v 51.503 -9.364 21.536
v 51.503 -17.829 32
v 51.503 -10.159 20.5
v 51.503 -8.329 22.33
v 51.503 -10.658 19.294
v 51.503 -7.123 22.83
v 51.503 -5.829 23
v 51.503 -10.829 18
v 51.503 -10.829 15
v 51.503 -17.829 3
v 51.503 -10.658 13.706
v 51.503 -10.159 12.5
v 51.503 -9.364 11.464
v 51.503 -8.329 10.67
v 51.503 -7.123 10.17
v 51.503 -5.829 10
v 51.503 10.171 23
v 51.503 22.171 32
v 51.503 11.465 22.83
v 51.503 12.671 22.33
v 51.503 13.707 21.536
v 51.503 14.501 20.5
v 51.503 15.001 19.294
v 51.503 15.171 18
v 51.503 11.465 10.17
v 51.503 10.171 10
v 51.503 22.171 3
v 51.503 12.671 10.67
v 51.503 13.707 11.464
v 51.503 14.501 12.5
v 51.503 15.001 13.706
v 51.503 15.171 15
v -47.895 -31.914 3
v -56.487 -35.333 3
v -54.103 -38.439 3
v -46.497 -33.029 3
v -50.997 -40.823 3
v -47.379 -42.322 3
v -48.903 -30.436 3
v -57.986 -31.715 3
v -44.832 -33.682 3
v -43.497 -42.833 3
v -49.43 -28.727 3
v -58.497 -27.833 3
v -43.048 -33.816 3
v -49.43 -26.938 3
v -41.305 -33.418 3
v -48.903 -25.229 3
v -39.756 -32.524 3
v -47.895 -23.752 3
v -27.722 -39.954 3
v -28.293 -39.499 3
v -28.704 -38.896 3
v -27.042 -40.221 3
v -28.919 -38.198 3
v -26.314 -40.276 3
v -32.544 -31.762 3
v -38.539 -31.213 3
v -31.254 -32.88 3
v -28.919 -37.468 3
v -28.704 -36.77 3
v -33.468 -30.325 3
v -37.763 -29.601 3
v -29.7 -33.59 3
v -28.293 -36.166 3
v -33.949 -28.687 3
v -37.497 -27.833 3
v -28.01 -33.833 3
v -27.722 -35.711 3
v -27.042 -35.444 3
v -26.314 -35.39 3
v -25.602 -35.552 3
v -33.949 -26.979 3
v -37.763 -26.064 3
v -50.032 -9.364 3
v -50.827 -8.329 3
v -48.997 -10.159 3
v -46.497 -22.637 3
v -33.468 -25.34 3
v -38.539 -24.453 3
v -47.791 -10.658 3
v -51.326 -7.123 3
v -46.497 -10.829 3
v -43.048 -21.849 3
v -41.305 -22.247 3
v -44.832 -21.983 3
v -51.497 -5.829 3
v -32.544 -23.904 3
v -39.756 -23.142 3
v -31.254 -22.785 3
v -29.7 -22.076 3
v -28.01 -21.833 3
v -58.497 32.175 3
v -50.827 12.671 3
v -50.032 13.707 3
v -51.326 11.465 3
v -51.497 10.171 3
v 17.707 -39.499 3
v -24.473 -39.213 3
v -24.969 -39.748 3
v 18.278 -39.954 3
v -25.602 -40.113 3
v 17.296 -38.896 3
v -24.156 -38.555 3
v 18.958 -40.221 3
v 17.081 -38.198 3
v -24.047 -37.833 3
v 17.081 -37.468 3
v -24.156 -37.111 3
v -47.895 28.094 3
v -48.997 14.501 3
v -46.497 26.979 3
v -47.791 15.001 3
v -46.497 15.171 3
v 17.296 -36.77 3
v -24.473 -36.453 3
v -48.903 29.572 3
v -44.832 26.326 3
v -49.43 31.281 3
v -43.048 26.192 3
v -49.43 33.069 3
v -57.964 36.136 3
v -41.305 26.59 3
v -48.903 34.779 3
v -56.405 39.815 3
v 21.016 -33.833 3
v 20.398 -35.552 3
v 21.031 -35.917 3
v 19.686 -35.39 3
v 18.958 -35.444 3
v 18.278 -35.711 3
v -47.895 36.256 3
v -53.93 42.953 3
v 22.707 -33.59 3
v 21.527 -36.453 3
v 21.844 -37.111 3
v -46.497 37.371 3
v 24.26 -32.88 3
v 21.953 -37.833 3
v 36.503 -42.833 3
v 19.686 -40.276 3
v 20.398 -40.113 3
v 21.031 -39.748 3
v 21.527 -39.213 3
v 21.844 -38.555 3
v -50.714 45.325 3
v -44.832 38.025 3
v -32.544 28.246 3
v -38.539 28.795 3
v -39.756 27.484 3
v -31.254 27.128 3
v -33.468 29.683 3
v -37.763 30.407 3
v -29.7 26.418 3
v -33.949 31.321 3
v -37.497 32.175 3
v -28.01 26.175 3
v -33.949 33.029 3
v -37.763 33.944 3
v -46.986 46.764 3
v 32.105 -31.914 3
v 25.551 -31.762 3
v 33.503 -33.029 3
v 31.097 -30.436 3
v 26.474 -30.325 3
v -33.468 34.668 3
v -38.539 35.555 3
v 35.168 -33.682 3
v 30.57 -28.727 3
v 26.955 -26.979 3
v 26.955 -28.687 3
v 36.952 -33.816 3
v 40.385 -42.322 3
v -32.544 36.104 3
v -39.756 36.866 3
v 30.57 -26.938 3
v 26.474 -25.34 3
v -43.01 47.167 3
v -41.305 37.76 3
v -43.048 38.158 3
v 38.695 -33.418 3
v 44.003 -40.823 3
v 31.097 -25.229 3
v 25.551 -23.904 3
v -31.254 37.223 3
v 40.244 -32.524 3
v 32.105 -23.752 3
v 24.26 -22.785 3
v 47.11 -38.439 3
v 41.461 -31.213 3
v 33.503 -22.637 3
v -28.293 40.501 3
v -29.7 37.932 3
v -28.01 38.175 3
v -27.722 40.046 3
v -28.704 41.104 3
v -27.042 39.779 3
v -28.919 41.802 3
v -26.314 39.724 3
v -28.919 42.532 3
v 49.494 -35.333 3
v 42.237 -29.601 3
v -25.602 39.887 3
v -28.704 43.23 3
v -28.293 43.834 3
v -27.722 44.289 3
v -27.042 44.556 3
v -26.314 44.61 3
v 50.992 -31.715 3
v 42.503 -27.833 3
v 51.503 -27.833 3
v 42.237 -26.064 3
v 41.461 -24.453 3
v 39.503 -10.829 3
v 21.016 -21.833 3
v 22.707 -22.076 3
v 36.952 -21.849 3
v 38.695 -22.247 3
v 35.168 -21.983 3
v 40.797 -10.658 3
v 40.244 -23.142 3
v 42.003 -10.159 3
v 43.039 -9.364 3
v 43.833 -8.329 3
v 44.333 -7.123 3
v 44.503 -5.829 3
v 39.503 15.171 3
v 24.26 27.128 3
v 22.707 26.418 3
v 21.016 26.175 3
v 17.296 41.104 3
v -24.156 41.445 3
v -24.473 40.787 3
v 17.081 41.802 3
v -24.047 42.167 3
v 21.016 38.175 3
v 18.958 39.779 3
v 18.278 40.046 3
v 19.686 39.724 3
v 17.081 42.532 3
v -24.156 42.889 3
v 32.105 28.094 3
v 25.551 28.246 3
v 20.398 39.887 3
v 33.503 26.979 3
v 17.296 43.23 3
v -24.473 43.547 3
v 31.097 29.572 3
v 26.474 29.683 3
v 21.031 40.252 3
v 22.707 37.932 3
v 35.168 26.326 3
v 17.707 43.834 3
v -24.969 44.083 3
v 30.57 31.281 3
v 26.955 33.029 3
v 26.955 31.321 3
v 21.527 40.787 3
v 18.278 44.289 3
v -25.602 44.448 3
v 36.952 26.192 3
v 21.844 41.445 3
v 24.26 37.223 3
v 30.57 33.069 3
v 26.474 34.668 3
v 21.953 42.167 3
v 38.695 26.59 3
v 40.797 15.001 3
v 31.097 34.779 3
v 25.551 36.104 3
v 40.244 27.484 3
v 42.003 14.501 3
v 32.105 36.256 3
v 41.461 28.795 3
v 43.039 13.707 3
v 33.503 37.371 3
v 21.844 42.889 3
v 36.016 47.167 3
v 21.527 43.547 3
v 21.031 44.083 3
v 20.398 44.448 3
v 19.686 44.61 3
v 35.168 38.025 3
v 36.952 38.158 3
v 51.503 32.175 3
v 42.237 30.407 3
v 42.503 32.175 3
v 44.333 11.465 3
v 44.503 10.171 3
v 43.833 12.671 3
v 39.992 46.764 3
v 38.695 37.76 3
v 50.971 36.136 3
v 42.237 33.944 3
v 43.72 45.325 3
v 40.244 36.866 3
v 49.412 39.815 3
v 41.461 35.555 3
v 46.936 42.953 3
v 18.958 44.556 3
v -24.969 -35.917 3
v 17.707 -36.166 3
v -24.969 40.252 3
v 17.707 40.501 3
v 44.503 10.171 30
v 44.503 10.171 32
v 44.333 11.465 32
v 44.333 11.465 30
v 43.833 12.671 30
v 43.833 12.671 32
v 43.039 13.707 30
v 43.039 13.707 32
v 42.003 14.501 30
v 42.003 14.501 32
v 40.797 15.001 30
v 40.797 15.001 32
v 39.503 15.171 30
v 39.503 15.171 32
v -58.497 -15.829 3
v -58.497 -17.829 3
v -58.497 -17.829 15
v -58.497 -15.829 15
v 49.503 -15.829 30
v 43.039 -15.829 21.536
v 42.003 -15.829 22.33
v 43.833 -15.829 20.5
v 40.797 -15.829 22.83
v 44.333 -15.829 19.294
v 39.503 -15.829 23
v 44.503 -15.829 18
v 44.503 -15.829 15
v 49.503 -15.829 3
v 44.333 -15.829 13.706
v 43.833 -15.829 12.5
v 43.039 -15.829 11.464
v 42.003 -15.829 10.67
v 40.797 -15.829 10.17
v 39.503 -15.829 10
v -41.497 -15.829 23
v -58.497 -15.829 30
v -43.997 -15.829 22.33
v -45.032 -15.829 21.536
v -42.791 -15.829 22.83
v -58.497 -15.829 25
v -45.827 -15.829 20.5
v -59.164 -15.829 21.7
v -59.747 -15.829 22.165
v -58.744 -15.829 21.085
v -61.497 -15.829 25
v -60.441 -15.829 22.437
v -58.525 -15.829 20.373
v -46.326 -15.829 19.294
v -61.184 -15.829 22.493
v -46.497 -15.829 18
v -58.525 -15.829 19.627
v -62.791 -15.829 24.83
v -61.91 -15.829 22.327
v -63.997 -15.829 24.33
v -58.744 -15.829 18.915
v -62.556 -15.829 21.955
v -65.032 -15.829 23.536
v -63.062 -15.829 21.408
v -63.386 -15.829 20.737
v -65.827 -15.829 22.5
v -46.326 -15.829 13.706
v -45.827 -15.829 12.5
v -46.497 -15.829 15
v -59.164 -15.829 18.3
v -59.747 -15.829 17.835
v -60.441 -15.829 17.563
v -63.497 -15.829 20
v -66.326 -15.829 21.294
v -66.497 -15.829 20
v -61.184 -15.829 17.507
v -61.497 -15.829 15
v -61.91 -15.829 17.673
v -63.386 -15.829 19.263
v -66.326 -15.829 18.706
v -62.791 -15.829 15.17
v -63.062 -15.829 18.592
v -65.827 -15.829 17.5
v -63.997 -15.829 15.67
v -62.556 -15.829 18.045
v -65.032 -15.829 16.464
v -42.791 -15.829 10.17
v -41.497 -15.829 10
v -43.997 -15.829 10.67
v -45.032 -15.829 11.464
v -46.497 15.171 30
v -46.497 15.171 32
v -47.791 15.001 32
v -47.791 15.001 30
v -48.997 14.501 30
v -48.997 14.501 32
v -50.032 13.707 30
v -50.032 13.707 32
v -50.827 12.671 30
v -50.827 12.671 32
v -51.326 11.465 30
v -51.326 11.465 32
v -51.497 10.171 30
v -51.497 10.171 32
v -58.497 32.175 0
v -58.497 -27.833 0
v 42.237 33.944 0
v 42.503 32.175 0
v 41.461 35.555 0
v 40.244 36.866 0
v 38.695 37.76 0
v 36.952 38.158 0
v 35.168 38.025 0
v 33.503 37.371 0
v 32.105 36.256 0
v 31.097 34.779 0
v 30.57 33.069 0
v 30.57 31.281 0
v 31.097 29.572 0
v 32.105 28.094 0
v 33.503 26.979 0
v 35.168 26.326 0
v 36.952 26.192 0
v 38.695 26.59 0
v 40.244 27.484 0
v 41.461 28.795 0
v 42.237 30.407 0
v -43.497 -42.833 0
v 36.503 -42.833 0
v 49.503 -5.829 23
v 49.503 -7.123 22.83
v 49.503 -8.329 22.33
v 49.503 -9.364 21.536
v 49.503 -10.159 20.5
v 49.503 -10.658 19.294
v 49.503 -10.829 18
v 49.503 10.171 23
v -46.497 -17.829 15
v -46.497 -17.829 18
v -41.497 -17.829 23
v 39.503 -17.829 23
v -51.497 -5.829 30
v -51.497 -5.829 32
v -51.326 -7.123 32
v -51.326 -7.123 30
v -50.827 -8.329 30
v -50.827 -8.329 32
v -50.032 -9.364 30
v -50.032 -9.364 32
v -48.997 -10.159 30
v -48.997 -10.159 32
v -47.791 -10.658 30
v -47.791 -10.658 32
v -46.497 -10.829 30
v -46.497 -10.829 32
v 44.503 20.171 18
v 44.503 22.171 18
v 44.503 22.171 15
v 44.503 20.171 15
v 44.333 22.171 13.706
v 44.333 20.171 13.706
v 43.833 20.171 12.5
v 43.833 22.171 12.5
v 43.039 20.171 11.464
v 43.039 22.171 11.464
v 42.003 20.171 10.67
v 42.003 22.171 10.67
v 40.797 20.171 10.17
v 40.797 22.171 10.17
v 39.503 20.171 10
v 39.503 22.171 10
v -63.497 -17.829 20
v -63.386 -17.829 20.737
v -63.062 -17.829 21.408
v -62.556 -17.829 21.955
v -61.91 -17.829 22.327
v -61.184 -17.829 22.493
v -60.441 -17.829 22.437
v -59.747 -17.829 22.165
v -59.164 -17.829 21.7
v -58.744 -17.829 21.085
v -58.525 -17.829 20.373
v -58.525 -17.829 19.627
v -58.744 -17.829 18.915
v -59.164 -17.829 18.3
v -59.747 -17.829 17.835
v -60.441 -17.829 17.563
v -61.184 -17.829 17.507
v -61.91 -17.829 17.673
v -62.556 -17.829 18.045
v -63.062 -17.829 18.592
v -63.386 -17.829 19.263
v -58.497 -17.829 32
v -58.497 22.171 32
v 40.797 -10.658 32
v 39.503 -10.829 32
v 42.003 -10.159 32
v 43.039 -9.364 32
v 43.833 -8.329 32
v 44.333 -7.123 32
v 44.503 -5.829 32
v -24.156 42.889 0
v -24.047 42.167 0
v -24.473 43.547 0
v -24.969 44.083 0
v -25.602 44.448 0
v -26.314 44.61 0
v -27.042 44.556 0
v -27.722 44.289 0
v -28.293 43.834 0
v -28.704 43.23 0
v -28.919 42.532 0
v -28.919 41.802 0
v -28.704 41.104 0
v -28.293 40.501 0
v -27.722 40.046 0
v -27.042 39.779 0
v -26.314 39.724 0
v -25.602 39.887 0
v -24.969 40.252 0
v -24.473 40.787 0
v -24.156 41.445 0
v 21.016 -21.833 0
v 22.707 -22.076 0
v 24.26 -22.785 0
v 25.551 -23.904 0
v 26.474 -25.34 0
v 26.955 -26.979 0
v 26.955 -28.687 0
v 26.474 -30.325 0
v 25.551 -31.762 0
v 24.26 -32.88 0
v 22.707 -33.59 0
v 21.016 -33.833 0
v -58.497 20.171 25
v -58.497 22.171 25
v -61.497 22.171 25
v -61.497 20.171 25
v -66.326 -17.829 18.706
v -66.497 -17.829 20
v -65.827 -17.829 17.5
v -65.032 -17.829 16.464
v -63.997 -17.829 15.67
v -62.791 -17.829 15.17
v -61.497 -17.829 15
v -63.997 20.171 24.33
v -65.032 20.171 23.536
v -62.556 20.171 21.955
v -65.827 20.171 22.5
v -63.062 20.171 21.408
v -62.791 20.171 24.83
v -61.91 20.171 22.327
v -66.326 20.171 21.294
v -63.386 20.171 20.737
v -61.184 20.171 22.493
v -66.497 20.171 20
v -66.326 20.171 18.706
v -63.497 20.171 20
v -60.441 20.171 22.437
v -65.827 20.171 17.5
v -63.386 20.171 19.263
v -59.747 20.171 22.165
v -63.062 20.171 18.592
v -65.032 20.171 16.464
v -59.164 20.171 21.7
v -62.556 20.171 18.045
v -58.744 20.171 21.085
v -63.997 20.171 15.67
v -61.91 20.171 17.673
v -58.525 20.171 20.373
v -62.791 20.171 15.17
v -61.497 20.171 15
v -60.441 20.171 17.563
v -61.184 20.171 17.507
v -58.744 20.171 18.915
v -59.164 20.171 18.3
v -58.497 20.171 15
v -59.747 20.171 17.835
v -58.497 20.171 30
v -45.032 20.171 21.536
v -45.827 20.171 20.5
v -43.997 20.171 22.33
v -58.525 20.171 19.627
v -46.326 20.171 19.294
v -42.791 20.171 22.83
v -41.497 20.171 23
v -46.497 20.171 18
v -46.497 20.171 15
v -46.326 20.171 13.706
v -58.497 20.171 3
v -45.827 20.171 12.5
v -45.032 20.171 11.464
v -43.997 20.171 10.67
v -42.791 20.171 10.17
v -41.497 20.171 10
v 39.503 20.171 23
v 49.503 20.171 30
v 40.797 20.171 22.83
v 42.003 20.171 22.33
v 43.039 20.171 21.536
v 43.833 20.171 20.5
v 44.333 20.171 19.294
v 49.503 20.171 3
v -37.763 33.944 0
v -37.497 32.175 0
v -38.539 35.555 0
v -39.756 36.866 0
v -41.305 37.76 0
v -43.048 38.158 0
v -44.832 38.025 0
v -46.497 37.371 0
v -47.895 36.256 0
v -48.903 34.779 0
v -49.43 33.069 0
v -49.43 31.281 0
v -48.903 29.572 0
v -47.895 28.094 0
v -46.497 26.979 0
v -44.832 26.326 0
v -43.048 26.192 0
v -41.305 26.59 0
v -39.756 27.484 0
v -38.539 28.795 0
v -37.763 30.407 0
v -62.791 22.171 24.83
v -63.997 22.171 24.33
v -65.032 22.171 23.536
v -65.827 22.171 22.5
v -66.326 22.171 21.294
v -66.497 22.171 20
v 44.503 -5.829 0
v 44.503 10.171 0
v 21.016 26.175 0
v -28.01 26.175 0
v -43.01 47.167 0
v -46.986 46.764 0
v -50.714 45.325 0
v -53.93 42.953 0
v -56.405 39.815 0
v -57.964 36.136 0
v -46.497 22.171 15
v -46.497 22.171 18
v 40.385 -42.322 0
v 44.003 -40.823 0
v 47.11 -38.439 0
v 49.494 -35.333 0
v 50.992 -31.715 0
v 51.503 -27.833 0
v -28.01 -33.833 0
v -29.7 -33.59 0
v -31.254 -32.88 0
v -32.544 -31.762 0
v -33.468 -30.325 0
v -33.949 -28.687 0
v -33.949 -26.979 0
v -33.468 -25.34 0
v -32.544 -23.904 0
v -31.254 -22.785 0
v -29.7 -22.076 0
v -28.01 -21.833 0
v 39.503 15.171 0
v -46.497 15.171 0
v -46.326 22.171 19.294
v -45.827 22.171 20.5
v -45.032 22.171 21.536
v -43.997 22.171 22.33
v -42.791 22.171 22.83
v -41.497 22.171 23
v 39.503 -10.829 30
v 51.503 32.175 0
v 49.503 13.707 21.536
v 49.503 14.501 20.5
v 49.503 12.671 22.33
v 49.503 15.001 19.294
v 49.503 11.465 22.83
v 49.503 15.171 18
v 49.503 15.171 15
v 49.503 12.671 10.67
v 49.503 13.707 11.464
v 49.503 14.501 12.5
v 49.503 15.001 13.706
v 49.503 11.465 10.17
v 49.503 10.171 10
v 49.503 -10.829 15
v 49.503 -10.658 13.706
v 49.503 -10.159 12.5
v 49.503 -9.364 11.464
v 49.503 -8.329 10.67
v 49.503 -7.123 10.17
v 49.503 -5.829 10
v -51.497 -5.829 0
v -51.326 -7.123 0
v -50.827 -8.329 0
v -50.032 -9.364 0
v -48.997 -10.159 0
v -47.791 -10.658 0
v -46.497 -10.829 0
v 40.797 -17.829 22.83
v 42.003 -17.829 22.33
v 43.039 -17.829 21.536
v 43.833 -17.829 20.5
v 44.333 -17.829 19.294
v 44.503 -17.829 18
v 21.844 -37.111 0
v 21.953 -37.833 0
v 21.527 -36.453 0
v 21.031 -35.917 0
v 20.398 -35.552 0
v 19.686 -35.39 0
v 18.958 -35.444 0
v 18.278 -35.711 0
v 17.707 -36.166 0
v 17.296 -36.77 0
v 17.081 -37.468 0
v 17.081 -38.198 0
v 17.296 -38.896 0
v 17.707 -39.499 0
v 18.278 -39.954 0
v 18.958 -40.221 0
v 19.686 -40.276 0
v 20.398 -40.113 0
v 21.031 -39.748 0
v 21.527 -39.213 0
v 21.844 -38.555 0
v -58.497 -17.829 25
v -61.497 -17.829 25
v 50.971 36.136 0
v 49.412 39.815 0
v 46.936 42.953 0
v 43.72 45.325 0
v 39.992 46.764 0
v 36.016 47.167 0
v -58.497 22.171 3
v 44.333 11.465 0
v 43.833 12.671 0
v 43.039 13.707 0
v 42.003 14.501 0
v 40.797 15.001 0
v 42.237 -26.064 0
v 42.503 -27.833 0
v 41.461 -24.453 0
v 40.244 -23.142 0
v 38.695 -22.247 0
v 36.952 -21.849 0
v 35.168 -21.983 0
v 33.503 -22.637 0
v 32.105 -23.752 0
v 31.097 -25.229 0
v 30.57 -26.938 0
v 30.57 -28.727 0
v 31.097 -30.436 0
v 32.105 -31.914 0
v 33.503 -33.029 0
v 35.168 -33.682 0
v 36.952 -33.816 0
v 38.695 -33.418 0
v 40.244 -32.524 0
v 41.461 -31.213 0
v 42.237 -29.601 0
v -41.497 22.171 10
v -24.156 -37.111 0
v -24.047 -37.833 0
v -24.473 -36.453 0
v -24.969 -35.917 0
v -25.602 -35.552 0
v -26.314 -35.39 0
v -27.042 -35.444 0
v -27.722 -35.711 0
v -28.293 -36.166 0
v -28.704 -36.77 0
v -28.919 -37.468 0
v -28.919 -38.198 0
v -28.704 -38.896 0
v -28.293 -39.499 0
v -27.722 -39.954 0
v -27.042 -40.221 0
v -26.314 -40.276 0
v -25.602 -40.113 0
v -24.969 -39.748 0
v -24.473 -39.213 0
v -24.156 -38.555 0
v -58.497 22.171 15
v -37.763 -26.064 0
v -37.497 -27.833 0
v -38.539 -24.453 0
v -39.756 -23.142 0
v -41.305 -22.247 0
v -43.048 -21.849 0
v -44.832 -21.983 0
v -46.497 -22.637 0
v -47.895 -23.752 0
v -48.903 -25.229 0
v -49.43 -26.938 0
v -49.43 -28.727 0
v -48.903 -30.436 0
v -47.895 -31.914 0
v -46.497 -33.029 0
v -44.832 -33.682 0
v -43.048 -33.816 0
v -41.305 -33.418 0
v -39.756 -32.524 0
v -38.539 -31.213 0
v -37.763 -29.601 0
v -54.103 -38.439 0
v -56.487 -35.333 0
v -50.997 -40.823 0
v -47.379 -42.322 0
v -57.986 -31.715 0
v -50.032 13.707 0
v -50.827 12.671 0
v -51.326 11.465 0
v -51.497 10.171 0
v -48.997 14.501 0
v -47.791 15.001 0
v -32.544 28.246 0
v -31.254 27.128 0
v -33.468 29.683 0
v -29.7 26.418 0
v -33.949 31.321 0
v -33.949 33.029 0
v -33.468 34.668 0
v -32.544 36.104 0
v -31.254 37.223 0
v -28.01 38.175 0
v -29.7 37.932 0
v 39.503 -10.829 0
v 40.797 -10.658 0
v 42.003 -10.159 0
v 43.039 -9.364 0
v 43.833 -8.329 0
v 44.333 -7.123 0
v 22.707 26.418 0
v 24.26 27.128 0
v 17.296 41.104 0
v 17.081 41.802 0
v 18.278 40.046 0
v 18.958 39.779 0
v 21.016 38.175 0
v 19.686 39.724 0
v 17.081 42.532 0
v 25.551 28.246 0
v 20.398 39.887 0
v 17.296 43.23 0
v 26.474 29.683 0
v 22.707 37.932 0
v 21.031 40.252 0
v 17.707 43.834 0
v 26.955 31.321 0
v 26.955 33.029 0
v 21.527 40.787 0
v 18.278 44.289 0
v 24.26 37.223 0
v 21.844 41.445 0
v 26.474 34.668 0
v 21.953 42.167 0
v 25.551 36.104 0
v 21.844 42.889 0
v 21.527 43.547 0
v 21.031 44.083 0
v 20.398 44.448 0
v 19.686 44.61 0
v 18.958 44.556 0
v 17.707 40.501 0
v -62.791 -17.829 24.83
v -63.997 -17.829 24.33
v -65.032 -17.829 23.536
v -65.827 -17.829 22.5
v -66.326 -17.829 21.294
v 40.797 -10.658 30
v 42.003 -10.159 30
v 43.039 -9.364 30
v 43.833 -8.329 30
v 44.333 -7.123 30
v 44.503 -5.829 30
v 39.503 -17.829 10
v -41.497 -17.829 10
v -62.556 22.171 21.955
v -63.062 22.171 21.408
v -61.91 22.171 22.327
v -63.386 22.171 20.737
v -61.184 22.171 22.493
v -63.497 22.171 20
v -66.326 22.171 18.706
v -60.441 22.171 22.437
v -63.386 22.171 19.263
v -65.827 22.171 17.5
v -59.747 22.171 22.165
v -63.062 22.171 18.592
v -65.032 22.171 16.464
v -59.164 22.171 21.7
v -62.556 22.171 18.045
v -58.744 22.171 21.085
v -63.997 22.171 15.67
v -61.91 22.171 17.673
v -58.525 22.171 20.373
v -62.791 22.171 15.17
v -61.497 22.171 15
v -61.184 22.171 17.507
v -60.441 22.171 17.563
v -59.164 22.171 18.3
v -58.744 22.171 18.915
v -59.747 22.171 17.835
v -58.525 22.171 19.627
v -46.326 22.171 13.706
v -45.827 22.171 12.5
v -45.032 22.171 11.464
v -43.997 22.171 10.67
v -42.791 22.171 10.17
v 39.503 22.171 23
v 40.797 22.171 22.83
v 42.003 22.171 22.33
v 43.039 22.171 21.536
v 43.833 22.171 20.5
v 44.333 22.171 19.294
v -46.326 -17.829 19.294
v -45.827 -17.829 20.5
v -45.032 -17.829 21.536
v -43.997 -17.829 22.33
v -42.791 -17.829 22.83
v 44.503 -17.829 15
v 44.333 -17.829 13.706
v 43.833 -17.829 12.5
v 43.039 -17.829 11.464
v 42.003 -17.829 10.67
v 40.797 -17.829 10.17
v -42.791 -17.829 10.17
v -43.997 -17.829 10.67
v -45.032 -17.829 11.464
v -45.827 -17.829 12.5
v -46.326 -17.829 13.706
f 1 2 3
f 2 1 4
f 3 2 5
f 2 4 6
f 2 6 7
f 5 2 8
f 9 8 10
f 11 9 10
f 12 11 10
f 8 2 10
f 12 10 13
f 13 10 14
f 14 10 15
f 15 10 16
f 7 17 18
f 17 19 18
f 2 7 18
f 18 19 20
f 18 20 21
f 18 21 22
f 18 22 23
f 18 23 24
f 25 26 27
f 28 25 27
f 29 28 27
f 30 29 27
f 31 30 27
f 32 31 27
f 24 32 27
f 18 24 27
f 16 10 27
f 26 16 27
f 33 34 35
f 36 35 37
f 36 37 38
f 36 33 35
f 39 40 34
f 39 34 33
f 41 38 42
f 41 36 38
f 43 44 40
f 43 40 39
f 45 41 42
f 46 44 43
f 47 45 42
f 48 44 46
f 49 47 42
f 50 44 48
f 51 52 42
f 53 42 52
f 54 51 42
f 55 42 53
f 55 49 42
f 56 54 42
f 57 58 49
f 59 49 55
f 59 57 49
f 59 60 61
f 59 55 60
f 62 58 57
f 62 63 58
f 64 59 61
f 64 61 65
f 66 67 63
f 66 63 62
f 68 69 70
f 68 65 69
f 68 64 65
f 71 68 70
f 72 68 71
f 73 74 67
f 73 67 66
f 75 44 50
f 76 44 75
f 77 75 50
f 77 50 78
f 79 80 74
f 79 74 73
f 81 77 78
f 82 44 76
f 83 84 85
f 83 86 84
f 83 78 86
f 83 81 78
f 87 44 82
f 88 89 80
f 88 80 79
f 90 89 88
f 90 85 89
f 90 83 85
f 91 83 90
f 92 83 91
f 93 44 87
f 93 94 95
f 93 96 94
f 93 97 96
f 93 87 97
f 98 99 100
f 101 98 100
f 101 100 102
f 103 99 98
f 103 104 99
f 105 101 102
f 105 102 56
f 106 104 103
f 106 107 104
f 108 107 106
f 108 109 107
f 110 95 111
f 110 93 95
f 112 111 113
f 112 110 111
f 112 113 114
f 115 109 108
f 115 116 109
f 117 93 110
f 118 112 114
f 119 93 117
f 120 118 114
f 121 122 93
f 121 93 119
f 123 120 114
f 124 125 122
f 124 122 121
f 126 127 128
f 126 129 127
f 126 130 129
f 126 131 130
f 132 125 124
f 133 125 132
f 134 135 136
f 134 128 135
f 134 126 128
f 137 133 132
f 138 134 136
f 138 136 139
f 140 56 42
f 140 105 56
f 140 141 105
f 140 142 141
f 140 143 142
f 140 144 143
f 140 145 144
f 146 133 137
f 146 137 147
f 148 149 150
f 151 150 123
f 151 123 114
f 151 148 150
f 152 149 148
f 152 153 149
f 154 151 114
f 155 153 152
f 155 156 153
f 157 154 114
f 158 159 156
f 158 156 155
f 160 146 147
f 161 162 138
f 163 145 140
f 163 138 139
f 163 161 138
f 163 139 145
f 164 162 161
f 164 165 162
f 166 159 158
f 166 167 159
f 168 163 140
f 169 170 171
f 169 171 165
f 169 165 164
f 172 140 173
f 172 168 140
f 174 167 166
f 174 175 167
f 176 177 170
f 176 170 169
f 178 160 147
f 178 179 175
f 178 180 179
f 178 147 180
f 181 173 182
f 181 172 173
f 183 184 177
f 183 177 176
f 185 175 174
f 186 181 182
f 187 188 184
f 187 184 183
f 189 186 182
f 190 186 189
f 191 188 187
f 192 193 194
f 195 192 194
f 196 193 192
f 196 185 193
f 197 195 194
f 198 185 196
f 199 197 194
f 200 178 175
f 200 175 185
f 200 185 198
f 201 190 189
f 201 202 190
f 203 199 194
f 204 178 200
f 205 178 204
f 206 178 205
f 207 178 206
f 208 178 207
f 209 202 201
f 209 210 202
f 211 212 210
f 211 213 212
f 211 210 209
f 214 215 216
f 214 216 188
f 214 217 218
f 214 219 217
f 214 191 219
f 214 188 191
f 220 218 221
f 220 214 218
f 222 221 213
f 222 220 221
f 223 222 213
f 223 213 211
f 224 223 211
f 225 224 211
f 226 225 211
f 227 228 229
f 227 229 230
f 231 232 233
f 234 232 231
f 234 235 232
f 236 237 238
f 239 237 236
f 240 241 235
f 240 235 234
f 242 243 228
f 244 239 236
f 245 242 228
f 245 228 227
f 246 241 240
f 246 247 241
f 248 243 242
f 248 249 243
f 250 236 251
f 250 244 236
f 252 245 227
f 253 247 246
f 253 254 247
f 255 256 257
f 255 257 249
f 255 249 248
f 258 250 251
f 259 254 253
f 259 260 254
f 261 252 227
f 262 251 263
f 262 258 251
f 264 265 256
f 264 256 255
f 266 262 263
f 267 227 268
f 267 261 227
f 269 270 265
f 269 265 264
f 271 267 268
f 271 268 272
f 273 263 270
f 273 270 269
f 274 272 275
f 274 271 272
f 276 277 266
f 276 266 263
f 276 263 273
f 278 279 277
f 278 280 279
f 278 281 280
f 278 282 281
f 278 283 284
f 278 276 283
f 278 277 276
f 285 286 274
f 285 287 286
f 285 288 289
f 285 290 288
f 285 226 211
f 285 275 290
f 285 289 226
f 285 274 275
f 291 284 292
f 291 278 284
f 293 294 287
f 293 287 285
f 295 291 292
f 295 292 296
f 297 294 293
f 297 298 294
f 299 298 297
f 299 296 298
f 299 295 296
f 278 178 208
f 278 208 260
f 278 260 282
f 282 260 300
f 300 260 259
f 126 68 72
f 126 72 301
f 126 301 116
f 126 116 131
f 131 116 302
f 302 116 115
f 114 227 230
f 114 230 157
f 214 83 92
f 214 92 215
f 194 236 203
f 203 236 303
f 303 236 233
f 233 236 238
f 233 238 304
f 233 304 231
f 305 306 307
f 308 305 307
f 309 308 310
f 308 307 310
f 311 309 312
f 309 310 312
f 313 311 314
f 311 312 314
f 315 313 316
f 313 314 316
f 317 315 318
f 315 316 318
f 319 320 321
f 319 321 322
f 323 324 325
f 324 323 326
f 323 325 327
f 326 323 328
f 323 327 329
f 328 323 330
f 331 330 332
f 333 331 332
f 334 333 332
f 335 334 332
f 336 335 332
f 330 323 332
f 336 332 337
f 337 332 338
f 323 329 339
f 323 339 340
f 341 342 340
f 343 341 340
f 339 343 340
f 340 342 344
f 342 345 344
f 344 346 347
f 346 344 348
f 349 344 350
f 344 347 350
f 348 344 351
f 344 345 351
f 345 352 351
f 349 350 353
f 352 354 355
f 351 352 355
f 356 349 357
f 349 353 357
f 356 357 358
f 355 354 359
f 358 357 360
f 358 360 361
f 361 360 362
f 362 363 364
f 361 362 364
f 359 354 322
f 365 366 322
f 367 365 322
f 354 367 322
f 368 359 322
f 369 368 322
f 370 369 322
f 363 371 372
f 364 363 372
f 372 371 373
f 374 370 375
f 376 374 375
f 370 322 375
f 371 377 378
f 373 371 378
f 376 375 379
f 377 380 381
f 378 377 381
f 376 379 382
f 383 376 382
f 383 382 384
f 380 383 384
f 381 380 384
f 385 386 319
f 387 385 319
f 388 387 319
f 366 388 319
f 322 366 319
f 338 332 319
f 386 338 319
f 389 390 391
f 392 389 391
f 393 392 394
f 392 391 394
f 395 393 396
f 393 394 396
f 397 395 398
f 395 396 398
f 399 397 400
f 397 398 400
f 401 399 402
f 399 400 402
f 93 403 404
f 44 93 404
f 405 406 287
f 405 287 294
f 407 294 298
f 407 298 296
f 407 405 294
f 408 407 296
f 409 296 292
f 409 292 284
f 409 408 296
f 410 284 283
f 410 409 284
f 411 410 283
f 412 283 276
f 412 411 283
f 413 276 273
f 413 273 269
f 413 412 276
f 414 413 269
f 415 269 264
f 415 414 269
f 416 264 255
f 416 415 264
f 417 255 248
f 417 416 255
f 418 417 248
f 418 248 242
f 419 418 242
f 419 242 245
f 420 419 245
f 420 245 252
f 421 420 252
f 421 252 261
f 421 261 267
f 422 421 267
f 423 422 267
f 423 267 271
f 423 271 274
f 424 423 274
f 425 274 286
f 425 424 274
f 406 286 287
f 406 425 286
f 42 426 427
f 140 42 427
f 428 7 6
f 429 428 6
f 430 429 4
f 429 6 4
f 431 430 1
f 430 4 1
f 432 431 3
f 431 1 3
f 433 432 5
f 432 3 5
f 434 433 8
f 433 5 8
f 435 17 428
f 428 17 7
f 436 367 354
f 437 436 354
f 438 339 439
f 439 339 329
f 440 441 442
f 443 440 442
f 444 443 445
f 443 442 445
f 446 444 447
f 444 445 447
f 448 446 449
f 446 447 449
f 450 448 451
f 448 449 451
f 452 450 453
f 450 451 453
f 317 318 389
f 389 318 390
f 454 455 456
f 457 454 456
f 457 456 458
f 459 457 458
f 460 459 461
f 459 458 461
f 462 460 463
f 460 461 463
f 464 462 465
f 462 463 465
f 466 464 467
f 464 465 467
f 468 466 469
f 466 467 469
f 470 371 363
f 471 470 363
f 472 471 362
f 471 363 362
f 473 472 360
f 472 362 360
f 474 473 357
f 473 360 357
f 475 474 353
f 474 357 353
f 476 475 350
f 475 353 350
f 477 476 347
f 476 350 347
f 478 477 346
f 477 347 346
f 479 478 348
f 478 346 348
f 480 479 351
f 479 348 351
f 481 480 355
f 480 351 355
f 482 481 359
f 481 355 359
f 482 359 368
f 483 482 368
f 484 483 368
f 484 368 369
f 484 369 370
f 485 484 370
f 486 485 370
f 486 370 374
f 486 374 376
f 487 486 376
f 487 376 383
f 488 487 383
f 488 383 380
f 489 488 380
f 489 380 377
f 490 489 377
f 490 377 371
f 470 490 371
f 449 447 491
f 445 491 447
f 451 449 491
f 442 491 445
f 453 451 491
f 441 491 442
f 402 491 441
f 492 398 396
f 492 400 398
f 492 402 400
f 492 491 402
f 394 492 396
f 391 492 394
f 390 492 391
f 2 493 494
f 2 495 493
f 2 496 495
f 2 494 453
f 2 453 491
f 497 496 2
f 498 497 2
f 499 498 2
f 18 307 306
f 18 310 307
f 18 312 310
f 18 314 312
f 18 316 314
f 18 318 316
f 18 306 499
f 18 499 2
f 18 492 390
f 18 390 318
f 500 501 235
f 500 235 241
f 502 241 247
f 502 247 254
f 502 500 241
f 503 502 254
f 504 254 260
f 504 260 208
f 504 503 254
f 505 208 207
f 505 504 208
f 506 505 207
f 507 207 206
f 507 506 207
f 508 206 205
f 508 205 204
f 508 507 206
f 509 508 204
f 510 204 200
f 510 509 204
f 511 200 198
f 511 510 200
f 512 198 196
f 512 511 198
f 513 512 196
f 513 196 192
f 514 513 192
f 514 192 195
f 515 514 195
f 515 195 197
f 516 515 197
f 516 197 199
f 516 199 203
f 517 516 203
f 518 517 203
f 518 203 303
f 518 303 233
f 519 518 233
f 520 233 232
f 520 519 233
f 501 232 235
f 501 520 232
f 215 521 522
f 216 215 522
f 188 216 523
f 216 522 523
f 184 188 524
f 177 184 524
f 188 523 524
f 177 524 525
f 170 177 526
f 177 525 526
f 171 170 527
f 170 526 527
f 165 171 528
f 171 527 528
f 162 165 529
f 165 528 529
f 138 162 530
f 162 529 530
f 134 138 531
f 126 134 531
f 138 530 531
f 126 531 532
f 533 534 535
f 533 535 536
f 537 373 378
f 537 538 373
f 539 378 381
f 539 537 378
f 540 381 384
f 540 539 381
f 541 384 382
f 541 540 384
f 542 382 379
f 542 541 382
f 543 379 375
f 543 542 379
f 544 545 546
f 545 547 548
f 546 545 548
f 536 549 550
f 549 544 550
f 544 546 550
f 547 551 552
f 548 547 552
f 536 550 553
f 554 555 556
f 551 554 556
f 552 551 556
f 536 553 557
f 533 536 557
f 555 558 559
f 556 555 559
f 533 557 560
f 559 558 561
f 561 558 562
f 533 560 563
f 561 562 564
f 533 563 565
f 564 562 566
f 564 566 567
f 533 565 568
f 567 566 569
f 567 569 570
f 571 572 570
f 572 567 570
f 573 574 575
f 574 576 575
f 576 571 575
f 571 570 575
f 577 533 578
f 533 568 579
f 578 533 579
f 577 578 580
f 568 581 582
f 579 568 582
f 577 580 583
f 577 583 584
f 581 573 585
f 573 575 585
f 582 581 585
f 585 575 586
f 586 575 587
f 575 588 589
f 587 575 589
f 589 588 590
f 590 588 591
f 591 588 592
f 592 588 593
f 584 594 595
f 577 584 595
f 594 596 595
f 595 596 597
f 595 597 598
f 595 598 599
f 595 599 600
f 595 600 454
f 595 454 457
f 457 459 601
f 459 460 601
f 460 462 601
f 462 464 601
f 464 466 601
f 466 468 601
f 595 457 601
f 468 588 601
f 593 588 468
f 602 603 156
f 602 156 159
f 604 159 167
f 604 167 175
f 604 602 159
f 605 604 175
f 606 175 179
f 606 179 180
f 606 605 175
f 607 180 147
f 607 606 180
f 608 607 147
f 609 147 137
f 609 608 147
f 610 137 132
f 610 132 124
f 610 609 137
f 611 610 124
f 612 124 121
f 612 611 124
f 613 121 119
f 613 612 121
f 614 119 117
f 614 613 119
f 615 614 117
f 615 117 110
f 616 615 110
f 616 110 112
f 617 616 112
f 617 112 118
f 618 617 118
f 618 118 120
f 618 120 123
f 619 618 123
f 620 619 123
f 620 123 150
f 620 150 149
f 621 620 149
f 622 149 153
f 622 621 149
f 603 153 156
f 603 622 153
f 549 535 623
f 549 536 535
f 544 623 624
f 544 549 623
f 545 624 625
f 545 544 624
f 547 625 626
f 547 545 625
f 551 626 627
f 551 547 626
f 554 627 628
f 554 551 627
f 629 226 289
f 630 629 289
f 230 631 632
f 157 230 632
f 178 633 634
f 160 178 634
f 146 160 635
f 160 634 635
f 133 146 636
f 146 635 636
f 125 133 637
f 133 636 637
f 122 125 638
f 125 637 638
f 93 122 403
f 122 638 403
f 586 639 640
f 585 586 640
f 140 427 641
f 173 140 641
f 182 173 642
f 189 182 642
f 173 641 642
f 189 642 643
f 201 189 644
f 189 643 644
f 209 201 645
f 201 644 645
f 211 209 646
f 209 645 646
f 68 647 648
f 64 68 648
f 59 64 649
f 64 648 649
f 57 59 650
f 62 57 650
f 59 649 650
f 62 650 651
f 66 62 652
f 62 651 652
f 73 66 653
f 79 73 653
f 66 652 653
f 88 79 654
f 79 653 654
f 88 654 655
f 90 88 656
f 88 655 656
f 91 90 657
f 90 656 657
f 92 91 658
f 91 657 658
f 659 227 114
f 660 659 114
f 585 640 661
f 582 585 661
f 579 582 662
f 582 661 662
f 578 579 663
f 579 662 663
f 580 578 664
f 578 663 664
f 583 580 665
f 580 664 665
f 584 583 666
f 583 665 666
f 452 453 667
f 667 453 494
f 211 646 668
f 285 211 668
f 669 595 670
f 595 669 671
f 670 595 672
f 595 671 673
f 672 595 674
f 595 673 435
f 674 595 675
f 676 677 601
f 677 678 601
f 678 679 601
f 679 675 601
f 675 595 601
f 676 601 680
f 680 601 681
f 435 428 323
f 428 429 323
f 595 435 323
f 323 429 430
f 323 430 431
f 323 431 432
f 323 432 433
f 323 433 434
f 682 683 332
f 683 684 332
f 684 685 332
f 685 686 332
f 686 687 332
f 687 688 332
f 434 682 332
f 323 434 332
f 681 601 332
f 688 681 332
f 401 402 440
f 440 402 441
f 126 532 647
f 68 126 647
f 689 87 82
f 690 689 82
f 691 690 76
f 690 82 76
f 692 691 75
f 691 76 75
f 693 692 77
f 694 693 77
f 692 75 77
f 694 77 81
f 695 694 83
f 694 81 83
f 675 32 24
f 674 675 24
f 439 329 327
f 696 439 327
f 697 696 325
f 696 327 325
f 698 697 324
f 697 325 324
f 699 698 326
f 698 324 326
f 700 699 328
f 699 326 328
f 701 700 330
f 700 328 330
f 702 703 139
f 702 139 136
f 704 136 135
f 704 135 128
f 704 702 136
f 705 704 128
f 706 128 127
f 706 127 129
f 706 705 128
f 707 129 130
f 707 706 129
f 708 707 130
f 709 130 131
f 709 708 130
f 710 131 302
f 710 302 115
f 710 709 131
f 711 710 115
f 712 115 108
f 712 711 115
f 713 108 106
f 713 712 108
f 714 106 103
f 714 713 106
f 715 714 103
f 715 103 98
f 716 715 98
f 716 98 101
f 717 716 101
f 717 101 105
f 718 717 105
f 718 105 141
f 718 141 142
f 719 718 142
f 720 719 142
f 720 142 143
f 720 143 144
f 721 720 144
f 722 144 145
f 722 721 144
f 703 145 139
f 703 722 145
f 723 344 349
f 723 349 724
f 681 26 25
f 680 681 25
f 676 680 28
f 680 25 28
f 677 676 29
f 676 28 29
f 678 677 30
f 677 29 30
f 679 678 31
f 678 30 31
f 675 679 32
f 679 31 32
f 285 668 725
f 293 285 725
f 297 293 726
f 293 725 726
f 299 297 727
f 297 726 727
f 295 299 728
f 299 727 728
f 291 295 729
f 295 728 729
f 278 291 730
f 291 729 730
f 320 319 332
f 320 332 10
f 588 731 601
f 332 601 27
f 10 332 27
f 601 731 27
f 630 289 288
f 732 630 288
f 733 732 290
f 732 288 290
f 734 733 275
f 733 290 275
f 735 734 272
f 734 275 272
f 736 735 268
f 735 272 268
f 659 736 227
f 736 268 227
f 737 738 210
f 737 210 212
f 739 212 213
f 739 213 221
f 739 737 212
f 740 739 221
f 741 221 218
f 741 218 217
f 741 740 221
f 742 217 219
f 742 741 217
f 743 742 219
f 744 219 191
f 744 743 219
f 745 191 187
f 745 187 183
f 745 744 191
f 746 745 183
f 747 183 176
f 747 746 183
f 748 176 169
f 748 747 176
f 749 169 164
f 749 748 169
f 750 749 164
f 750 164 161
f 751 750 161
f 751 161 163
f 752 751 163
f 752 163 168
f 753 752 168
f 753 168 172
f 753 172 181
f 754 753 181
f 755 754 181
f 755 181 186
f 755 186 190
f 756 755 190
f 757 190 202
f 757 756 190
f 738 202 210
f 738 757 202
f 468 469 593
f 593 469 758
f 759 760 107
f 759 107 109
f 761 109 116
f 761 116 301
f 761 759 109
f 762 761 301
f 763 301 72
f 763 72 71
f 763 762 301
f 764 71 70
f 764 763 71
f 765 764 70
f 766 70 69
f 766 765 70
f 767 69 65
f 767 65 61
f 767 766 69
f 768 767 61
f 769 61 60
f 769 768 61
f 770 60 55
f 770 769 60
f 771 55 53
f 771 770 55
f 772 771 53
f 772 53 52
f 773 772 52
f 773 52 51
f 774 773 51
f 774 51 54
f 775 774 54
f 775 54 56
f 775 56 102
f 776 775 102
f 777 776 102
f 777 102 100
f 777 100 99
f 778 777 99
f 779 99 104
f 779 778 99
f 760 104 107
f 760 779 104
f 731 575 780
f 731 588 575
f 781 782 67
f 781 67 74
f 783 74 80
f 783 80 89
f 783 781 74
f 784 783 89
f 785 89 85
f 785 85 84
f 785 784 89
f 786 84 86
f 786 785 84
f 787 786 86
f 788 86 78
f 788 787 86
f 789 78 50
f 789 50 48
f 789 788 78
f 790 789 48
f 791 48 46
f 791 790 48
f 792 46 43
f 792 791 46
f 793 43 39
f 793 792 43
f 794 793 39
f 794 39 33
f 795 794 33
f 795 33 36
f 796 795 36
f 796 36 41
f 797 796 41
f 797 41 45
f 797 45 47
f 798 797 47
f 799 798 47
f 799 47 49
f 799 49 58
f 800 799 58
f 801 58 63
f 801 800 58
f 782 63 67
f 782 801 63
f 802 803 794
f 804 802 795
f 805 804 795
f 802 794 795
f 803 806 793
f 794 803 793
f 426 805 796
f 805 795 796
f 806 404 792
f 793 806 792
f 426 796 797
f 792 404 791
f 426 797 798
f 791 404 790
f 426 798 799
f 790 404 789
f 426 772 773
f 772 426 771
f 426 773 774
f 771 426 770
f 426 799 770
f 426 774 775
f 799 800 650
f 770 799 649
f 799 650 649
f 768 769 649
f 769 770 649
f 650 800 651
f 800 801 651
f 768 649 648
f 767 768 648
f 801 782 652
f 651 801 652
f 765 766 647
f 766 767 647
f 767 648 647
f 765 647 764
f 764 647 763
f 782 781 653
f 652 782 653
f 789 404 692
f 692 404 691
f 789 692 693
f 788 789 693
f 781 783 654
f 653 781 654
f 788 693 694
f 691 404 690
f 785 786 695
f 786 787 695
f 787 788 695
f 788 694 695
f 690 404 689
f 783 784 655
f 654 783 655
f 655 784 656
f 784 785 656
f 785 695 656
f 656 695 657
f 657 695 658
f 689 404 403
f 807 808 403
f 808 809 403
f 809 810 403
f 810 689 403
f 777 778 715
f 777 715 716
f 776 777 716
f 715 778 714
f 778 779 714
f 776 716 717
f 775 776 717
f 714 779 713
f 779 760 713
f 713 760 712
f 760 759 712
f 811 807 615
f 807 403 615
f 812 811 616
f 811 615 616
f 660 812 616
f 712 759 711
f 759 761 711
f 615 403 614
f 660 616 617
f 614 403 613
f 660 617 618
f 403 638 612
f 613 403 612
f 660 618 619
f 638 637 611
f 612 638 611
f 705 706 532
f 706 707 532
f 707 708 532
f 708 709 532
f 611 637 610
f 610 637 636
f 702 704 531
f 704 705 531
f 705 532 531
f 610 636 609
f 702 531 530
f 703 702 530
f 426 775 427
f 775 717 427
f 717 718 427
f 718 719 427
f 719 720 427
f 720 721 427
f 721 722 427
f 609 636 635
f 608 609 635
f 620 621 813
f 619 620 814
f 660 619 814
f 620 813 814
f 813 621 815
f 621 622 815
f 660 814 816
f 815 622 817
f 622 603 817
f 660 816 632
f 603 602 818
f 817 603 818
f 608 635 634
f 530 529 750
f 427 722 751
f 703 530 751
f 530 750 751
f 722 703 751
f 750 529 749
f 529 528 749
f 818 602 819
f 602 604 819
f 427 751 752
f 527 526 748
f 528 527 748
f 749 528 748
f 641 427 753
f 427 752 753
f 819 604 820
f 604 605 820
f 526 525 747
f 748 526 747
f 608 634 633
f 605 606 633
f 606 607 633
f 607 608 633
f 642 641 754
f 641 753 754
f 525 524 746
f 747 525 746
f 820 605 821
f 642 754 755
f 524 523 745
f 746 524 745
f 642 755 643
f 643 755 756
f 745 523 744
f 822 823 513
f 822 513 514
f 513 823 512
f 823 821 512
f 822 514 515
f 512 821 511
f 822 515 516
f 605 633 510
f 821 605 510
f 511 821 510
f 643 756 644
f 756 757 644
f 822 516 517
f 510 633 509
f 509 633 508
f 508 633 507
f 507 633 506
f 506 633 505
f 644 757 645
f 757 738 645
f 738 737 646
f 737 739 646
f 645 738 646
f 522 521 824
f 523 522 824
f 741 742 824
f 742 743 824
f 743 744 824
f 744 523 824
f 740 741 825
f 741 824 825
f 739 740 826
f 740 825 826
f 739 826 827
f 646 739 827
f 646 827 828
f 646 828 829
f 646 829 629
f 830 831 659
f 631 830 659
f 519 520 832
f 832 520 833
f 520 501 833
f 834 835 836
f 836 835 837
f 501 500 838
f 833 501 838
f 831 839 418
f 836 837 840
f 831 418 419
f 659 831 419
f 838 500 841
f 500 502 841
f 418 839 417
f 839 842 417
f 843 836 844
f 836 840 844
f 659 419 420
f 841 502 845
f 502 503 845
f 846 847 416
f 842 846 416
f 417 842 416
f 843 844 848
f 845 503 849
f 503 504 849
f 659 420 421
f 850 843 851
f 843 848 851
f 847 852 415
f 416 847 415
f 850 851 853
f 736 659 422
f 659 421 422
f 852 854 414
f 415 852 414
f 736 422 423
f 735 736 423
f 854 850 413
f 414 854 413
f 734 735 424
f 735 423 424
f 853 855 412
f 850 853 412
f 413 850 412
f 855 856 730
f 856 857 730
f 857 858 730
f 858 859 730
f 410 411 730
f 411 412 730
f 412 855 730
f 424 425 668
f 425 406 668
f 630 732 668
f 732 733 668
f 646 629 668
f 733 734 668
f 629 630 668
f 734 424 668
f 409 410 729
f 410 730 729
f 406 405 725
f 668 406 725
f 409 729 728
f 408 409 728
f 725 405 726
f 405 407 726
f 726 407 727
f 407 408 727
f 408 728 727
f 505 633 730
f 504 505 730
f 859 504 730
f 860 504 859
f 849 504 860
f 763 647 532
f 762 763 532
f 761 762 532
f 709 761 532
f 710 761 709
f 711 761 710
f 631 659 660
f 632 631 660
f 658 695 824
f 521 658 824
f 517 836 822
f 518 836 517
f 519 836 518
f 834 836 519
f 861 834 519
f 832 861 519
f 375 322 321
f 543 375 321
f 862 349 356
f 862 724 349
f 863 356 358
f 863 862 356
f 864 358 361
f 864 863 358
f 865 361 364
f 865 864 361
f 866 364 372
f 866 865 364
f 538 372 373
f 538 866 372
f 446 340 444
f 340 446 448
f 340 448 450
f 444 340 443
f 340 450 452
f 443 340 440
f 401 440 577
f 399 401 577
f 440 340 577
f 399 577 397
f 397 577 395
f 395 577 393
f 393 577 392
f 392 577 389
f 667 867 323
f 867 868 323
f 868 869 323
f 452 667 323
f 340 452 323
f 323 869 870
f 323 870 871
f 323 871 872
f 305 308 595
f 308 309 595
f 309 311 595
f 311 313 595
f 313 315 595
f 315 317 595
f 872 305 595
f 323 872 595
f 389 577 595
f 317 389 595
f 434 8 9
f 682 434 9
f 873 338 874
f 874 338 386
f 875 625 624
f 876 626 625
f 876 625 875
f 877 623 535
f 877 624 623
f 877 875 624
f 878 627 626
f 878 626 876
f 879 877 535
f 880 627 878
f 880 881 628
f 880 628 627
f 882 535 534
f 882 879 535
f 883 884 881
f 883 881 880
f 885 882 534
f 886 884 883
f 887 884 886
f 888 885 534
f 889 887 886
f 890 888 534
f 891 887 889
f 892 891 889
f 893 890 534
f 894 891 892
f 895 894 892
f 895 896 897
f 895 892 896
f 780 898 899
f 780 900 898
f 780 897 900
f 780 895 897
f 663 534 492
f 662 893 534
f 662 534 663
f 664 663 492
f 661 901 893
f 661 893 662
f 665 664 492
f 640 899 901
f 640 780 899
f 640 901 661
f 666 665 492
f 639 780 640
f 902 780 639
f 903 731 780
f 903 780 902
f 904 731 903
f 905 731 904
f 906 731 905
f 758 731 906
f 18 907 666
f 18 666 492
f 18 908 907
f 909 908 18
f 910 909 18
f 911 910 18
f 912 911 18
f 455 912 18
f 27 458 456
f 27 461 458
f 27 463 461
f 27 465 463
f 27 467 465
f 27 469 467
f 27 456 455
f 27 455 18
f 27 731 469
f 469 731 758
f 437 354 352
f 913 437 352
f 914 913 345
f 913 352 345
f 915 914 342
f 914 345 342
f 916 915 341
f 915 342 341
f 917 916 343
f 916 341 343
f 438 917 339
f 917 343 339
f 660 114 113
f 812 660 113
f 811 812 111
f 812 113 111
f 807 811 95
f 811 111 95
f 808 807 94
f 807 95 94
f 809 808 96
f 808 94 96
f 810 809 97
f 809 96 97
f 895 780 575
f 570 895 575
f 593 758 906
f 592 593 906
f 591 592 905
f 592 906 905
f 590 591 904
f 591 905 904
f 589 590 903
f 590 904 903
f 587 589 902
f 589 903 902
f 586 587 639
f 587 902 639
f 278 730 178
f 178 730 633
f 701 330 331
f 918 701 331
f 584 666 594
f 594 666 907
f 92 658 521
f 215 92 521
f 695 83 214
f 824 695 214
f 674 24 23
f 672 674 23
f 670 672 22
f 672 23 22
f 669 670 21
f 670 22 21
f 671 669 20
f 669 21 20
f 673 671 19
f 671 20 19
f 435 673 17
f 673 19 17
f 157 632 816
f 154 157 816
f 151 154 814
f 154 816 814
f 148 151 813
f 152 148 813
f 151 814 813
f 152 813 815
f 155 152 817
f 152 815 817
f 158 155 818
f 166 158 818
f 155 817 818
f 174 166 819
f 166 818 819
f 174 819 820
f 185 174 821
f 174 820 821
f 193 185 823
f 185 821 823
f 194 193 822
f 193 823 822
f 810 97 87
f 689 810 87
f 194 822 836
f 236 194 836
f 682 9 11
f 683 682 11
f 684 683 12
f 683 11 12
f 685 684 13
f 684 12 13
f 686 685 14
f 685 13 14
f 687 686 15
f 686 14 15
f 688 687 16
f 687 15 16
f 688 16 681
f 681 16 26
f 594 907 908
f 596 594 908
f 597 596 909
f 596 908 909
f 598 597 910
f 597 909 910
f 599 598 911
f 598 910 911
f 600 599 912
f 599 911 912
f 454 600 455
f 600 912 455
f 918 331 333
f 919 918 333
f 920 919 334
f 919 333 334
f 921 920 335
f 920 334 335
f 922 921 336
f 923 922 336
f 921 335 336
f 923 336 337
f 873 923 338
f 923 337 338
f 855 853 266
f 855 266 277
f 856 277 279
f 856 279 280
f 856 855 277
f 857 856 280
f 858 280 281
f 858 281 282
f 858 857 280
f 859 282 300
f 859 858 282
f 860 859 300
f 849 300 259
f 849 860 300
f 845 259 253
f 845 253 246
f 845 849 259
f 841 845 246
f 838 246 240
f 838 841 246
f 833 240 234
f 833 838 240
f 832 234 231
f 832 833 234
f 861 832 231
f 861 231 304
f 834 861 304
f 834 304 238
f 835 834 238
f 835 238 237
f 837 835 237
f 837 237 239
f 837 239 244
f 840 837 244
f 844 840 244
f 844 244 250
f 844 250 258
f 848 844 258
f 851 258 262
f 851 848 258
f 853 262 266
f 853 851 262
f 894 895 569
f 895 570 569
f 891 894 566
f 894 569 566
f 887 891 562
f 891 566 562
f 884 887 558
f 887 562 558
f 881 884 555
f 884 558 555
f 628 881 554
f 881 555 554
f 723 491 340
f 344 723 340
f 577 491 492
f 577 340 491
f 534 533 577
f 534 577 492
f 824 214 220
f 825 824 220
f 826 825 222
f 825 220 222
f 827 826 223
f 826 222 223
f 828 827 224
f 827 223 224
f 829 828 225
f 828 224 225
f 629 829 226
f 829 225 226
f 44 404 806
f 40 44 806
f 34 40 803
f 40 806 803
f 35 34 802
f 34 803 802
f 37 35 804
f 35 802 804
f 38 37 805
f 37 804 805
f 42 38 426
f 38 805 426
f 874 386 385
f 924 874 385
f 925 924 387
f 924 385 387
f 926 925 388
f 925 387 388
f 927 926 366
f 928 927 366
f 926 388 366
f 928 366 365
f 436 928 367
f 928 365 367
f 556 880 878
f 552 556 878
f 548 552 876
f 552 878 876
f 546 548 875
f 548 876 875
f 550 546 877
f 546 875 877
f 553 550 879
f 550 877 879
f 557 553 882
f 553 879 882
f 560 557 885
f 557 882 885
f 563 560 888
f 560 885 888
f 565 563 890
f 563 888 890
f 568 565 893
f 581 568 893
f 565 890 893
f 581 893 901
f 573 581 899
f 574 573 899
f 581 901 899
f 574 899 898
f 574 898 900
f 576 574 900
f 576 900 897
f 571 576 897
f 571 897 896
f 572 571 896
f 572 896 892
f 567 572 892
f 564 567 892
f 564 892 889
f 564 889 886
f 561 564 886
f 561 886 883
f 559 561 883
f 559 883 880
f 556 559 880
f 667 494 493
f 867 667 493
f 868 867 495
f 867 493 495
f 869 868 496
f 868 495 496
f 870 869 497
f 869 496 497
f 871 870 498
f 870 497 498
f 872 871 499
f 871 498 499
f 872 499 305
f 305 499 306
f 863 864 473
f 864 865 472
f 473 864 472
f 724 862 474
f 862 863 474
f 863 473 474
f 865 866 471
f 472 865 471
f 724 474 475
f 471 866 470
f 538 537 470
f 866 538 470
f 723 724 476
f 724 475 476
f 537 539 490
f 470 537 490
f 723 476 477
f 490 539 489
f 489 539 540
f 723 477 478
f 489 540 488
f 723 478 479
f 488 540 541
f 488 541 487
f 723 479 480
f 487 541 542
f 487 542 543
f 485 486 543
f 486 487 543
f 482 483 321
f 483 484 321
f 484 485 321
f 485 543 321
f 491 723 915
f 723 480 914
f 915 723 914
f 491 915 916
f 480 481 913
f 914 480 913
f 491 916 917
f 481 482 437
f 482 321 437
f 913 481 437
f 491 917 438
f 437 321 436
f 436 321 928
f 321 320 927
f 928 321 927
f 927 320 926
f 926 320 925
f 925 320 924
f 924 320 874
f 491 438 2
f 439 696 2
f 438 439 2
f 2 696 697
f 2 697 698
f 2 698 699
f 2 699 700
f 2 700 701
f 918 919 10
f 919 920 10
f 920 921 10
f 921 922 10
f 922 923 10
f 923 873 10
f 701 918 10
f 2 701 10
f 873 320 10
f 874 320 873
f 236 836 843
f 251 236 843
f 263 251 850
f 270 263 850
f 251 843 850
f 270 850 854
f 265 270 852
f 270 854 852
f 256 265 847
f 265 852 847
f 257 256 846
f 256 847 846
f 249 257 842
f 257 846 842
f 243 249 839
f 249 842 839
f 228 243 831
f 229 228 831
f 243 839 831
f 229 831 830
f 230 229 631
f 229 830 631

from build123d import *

# Parameters (mm, degrees)
F0_R      = 6
F0_R_2    = 2.45
F1_DEPTH  = 3
F3_DEPTH  = 27
F5_DEPTH  = 25
F7_DEPTH  = 100
F8_W      = 110
F8_H      = 40
F9_DEPTH  = 2
F11_DEPTH = 50
F12_W     = 2
F12_H     = 10
F13_DEPTH = 8
F14_R     = 2.5
F15_DEPTH = 50
F16_R     = 4.99999


# Not quite as in the source:
# - a fillet or chamfer is up to 0.001 mm smaller than in the source, because OpenCascade refuses the exact size


with BuildPart() as f1:
    # F0 (on Top) → F1 (new body)
    with BuildSketch(Plane.XY):
        with BuildLine():
            Line((36.0161362187, 47.167300203), (-43.0098088973, 47.167300203))
            ThreePointArc((-43.0098088973, 47.167300203), (-53.9298270028, 42.9526252844), (-58.4968363393, 32.1752088122))
            Line((-58.4968363393, 32.1752088122), (-58.4968363393, -27.832699797))
            ThreePointArc((-58.4968363393, -27.832699797), (-54.1034380571, -38.4393015148), (-43.4968363393, -42.832699797))
            Line((-43.4968363393, -42.832699797), (36.5031636607, -42.832699797))
            ThreePointArc((36.5031636607, -42.832699797), (47.1097653785, -38.4393015148), (51.5031636607, -27.832699797))
            Line((51.5031636607, -27.832699797), (51.5031636607, 32.1752088122))
            ThreePointArc((51.5031636607, 32.1752088122), (46.9361543242, 42.9526252844), (36.0161362187, 47.167300203))
        make_face()
        with Locations((-43.4968363393, -27.832699797)):
            Circle(F0_R, mode=Mode.SUBTRACT)
        with Locations((-26.4968363393, -37.832699797)):
            Circle(F0_R_2, mode=Mode.SUBTRACT)
        with BuildLine():
            ThreePointArc((-28.0098088973, -33.832699797), (-34.0098088973, -27.832699797), (-28.0098088973, -21.832699797))
            Line((-28.0098088973, -21.832699797), (21.0161362187, -21.832699797))
            ThreePointArc((21.0161362187, -21.832699797), (27.0161362187, -27.832699797), (21.0161362187, -33.832699797))
            Line((21.0161362187, -33.832699797), (-28.0098088973, -33.832699797))
        make_face(mode=Mode.SUBTRACT)
        with Locations((19.5031636607, -37.832699797)):
            Circle(F0_R_2, mode=Mode.SUBTRACT)
        with Locations((36.5031636607, -27.832699797)):
            Circle(F0_R, mode=Mode.SUBTRACT)
        with Locations((-43.4968363393, 32.1752088122)):
            Circle(F0_R, mode=Mode.SUBTRACT)
        with BuildLine():
            ThreePointArc((-28.0098088973, 26.1752088122), (-34.0098088973, 32.1752088122), (-28.0098088973, 38.1752088122))
            Line((-28.0098088973, 38.1752088122), (21.0161362187, 38.1752088122))
            ThreePointArc((21.0161362187, 38.1752088122), (27.0161362187, 32.1752088122), (21.0161362187, 26.1752088122))
            Line((21.0161362187, 26.1752088122), (-28.0098088973, 26.1752088122))
        make_face(mode=Mode.SUBTRACT)
        with Locations((-26.4968363393, 42.167300203)):
            Circle(F0_R_2, mode=Mode.SUBTRACT)
        with Locations((19.5031636607, 42.167300203)):
            Circle(F0_R_2, mode=Mode.SUBTRACT)
        with Locations((36.5031636607, 32.1752088122)):
            Circle(F0_R, mode=Mode.SUBTRACT)
    extrude(amount=F1_DEPTH)


with BuildPart() as f3:
    # F2 (on face) → F3 (new body)
    with BuildSketch(Plane.XY.offset(3)):
        Polygon((-58.4968363393, 22.1712545076), (-58.4968363393, 20.1712545076), (49.5031636607, 20.1712545076), (49.5031636607, -15.8287454924), (-58.4968363393, -15.8287454924), (-58.4968363393, -17.8287454924), (51.5031636607, -17.8287454924), (51.5031636607, -15.8287454924), (51.5031636607, 20.1712545076), (51.5031636607, 22.1712545076), align=None)
    extrude(amount=F3_DEPTH)

    # F4 (on face) → F5 (cut)
    with BuildSketch(Plane.YZ.offset(51.5031636607)):
        with BuildLine():
            Line((10.1712545076, 23), (-5.8287454924, 23))
            ThreePointArc((-5.8287454924, 23), (-9.3642793983, 21.5355339059), (-10.8287454924, 18))
            Line((-10.8287454924, 18), (-10.8287454924, 15))
            ThreePointArc((-10.8287454924, 15), (-9.3642793983, 11.4644660941), (-5.8287454924, 10))
            Line((-5.8287454924, 10), (10.1712545076, 10))
            ThreePointArc((10.1712545076, 10), (13.7067884136, 11.4644660941), (15.1712545076, 15))
            Line((15.1712545076, 15), (15.1712545076, 18))
            ThreePointArc((15.1712545076, 18), (13.7067884136, 21.5355339059), (10.1712545076, 23))
        make_face()
    extrude(amount=-F5_DEPTH, mode=Mode.SUBTRACT)

    # F6 (on face) → F7 (cut)
    with BuildSketch(Plane(origin=(0, 22.1712545076, 0), x_dir=(-1, 0, 0), z_dir=(0, 1, 0))):
        with BuildLine():
            Line((41.4968363393, 23), (-39.5031636607, 23))
            ThreePointArc((-39.5031636607, 23), (-43.0386975666, 21.5355339059), (-44.5031636607, 18))
            Line((-44.5031636607, 18), (-44.5031636607, 15))
            ThreePointArc((-44.5031636607, 15), (-43.0386975666, 11.4644660941), (-39.5031636607, 10))
            Line((-39.5031636607, 10), (41.4968363393, 10))
            ThreePointArc((41.4968363393, 10), (45.0323702452, 11.4644660941), (46.4968363393, 15))
            Line((46.4968363393, 15), (46.4968363393, 18))
            ThreePointArc((46.4968363393, 18), (45.0323702452, 21.5355339059), (41.4968363393, 23))
        make_face()
    extrude(amount=-F7_DEPTH, mode=Mode.SUBTRACT)

    # F8 (on face) → F9 (join)
    with BuildSketch(Plane.XY.offset(30)):
        with Locations((-3.4968363393, 2.1712545076)):
            Rectangle(F8_W, F8_H)
    extrude(amount=F9_DEPTH)


with BuildPart() as f11_tool:
    # F10 (on face) → F11 (new body)
    with BuildSketch(Plane.XY.offset(32)):
        with BuildLine():
            Line((39.5031636607, 15.1712545076), (-46.4968363393, 15.1712545076))
            ThreePointArc((-46.4968363393, 15.1712545076), (-50.0323702452, 13.7067884136), (-51.4968363393, 10.1712545076))
            Line((-51.4968363393, 10.1712545076), (-51.4968363393, -5.8287454924))
            ThreePointArc((-51.4968363393, -5.8287454924), (-50.0323702452, -9.3642793983), (-46.4968363393, -10.8287454924))
            Line((-46.4968363393, -10.8287454924), (39.5031636607, -10.8287454924))
            ThreePointArc((39.5031636607, -10.8287454924), (43.0386975666, -9.3642793983), (44.5031636607, -5.8287454924))
            Line((44.5031636607, -5.8287454924), (44.5031636607, 10.1712545076))
            ThreePointArc((44.5031636607, 10.1712545076), (43.0386975666, 13.7067884136), (39.5031636607, 15.1712545076))
        make_face()
    extrude(amount=-F11_DEPTH)


with BuildPart() as f1_1:
    add(f1.part)

    # F11: cut by f11_tool
    add(f11_tool.part, mode=Mode.SUBTRACT)


with BuildPart() as f3_1:
    add(f3.part)

    # F11: cut by f11_tool
    add(f11_tool.part, mode=Mode.SUBTRACT)

    # F12 (on face) → F13 (join)
    with BuildSketch(Plane(origin=(-58.4968363393, 0, 0), x_dir=(0, -1, 0), z_dir=(-1, 0, 0))):
        with Locations((-21.1712545076, 20)):
            Rectangle(F12_W, F12_H)
        with Locations((16.8287454924, 20)):
            Rectangle(F12_W, F12_H)
    extrude(amount=F13_DEPTH)

    # F14 (on face) → F15 (cut)
    with BuildSketch(Plane(origin=(0, 22.1712545076, 0), x_dir=(-1, 0, 0), z_dir=(0, 1, 0))):
        with Locations((60.9968363393, 20)):
            Circle(F14_R)
    extrude(amount=-F15_DEPTH, mode=Mode.SUBTRACT)

    # F16 (radius 5 in the source; OpenCascade refuses exactly that, so slightly less here)
    f16_edges = [f3_1.edges().sort_by_distance(p)[0] for p in [
        (-66.496836, -16.828745, 25),
        (-66.496836, -16.828745, 15),
        (-66.496836, 21.171255, 15),
        (-66.496836, 21.171255, 25),
    ]]
    fillet(f16_edges, radius=F16_R)


solid = Compound([f1_1.part, f3_1.part])
